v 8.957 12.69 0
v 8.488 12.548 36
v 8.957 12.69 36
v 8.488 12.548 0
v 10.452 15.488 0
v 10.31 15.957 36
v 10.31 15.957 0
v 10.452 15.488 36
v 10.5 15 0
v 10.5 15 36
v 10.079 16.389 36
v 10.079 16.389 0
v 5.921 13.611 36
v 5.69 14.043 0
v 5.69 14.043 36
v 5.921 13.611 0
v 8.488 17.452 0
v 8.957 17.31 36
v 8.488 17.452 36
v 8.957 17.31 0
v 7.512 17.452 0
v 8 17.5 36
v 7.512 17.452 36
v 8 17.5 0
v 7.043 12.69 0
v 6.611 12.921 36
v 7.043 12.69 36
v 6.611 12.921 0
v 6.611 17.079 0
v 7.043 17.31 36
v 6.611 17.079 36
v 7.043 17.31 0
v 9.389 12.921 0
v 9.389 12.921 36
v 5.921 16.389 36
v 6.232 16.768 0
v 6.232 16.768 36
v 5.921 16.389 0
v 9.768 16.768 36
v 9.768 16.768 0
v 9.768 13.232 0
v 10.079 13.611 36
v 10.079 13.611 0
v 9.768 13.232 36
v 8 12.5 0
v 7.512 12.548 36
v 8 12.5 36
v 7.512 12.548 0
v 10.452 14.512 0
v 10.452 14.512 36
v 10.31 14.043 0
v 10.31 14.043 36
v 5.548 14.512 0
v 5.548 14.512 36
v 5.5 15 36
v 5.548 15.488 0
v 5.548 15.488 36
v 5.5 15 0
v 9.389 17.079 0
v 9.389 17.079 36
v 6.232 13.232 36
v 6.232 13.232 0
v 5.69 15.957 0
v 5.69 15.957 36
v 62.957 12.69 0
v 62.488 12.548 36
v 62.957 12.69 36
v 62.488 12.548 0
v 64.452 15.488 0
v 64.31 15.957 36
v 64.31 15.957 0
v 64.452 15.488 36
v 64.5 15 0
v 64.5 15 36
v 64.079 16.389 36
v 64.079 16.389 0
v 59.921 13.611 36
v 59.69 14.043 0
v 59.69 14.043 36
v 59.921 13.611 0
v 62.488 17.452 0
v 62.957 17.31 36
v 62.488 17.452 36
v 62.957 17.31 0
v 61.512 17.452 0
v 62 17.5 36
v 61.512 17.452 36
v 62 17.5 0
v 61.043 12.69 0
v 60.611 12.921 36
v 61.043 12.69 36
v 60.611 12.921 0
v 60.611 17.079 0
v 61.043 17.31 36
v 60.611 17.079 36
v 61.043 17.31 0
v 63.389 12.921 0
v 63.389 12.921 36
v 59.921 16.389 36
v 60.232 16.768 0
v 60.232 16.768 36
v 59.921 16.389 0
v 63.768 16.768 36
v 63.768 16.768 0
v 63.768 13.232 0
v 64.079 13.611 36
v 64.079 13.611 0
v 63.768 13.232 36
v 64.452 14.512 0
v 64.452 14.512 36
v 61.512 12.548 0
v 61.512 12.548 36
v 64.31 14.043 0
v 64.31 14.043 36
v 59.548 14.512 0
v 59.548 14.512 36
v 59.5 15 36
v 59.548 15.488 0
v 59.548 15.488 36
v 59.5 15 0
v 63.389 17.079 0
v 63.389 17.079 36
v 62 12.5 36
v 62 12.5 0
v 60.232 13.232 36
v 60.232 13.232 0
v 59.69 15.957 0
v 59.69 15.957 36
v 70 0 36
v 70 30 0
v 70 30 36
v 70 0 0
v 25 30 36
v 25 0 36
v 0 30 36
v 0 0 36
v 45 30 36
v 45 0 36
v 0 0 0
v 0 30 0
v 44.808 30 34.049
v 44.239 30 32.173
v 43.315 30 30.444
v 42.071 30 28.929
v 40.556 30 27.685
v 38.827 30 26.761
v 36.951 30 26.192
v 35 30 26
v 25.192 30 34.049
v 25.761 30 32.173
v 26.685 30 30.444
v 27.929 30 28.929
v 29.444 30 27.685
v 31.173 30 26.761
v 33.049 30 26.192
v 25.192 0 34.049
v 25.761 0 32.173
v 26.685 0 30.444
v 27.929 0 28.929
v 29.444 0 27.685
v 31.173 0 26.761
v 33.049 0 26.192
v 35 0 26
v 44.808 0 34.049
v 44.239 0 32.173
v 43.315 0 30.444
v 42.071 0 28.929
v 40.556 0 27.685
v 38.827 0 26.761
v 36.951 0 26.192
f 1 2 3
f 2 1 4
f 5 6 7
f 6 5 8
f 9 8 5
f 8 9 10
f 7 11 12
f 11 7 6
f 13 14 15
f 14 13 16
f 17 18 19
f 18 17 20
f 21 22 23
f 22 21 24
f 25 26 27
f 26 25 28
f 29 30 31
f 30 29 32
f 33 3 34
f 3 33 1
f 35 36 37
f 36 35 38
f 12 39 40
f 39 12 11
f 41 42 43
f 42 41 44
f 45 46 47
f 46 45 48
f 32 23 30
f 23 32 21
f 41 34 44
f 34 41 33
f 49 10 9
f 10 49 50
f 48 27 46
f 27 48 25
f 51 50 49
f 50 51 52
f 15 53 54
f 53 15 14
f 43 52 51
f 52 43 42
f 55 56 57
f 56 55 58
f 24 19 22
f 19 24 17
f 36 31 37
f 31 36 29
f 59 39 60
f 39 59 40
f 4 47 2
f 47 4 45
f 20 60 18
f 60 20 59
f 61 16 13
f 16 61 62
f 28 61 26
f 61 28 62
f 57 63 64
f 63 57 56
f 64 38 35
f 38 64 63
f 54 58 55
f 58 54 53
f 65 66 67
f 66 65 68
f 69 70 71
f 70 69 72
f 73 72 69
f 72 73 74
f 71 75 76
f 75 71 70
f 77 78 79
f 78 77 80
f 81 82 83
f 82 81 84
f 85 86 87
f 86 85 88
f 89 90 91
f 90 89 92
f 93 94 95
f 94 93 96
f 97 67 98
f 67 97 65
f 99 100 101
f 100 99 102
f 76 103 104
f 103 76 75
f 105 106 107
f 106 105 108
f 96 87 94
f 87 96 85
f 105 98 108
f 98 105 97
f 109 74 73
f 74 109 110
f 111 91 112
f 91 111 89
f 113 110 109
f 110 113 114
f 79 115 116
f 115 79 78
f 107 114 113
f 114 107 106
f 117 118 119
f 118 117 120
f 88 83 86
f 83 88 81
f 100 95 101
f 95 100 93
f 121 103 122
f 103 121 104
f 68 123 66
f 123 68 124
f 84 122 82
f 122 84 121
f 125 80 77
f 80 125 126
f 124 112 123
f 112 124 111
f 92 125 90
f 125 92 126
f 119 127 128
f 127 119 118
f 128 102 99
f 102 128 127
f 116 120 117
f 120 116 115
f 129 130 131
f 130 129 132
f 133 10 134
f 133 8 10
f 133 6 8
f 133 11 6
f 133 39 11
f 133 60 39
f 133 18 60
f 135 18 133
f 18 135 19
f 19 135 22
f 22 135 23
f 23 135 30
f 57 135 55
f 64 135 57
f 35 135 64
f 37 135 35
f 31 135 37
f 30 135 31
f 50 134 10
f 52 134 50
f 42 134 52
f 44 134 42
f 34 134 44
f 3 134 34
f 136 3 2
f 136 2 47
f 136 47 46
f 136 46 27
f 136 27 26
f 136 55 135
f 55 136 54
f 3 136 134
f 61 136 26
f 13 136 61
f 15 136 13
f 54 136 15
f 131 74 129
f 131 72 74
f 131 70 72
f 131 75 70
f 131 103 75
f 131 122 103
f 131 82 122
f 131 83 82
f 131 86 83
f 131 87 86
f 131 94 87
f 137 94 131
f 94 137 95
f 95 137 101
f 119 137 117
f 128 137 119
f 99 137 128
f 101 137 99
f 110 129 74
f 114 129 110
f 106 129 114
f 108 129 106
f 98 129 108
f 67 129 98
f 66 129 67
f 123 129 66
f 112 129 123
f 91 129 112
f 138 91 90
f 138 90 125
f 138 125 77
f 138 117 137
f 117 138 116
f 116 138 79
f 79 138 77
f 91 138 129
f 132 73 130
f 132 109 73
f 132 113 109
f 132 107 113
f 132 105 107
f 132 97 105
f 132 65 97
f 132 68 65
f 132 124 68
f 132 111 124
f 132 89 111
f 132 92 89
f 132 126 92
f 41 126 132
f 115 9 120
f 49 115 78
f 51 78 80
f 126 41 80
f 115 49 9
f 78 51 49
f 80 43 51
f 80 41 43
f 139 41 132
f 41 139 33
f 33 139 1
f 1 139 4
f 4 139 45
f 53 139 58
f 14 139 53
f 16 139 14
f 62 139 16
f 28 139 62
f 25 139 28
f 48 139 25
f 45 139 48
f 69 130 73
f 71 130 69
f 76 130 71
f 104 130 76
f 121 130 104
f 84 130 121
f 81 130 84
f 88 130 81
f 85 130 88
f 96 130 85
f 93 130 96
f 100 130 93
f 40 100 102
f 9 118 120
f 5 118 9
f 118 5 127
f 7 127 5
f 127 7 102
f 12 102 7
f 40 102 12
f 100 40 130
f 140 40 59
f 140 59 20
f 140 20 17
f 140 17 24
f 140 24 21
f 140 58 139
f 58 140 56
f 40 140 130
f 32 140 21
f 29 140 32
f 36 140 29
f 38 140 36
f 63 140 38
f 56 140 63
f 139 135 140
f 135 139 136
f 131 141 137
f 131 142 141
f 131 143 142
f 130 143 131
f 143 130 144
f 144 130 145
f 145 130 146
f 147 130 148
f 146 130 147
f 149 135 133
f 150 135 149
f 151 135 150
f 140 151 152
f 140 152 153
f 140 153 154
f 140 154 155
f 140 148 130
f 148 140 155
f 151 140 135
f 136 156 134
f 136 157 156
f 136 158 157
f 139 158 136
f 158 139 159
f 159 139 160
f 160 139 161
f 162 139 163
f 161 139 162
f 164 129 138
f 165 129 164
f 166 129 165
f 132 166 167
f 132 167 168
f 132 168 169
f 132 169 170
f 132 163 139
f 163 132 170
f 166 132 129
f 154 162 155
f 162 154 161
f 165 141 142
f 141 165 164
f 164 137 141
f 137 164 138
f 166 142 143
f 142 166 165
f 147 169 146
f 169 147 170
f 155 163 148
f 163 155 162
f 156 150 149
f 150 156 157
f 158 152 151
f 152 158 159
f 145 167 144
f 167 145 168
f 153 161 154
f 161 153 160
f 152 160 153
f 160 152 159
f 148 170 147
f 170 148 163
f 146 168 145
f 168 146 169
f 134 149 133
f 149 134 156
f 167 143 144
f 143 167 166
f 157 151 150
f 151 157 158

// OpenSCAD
$fn = 32;

// ----------------------------------------------------------------------
// Saddle clamp: plain shaft clamp
// ----------------------------------------------------------------------

// --- parameters (mm) ---
blk_l = 70;               // block length, X
blk_w = 30;               // block width, Y
blk_h = 36;               // block height
clamp_r = 10;             // shaft groove radius
hole_r = 2.5;             // bolt hole radius
hole_m = 8;               // bolt hole margin from the ends

saw_depth = clamp_r + 3;  // saw kerf depth

difference() {
  cube([blk_l, blk_w, blk_h]);
  translate([blk_l / 2, -1, blk_h])
    rotate([-90, 0, 0])
      cylinder(h = blk_w + 2, r = clamp_r);
  for (sx = [0, 1])
    translate([sx ? blk_l - hole_m : hole_m, blk_w / 2, -1])
      cylinder(r = hole_r, h = blk_h + 2);
}
